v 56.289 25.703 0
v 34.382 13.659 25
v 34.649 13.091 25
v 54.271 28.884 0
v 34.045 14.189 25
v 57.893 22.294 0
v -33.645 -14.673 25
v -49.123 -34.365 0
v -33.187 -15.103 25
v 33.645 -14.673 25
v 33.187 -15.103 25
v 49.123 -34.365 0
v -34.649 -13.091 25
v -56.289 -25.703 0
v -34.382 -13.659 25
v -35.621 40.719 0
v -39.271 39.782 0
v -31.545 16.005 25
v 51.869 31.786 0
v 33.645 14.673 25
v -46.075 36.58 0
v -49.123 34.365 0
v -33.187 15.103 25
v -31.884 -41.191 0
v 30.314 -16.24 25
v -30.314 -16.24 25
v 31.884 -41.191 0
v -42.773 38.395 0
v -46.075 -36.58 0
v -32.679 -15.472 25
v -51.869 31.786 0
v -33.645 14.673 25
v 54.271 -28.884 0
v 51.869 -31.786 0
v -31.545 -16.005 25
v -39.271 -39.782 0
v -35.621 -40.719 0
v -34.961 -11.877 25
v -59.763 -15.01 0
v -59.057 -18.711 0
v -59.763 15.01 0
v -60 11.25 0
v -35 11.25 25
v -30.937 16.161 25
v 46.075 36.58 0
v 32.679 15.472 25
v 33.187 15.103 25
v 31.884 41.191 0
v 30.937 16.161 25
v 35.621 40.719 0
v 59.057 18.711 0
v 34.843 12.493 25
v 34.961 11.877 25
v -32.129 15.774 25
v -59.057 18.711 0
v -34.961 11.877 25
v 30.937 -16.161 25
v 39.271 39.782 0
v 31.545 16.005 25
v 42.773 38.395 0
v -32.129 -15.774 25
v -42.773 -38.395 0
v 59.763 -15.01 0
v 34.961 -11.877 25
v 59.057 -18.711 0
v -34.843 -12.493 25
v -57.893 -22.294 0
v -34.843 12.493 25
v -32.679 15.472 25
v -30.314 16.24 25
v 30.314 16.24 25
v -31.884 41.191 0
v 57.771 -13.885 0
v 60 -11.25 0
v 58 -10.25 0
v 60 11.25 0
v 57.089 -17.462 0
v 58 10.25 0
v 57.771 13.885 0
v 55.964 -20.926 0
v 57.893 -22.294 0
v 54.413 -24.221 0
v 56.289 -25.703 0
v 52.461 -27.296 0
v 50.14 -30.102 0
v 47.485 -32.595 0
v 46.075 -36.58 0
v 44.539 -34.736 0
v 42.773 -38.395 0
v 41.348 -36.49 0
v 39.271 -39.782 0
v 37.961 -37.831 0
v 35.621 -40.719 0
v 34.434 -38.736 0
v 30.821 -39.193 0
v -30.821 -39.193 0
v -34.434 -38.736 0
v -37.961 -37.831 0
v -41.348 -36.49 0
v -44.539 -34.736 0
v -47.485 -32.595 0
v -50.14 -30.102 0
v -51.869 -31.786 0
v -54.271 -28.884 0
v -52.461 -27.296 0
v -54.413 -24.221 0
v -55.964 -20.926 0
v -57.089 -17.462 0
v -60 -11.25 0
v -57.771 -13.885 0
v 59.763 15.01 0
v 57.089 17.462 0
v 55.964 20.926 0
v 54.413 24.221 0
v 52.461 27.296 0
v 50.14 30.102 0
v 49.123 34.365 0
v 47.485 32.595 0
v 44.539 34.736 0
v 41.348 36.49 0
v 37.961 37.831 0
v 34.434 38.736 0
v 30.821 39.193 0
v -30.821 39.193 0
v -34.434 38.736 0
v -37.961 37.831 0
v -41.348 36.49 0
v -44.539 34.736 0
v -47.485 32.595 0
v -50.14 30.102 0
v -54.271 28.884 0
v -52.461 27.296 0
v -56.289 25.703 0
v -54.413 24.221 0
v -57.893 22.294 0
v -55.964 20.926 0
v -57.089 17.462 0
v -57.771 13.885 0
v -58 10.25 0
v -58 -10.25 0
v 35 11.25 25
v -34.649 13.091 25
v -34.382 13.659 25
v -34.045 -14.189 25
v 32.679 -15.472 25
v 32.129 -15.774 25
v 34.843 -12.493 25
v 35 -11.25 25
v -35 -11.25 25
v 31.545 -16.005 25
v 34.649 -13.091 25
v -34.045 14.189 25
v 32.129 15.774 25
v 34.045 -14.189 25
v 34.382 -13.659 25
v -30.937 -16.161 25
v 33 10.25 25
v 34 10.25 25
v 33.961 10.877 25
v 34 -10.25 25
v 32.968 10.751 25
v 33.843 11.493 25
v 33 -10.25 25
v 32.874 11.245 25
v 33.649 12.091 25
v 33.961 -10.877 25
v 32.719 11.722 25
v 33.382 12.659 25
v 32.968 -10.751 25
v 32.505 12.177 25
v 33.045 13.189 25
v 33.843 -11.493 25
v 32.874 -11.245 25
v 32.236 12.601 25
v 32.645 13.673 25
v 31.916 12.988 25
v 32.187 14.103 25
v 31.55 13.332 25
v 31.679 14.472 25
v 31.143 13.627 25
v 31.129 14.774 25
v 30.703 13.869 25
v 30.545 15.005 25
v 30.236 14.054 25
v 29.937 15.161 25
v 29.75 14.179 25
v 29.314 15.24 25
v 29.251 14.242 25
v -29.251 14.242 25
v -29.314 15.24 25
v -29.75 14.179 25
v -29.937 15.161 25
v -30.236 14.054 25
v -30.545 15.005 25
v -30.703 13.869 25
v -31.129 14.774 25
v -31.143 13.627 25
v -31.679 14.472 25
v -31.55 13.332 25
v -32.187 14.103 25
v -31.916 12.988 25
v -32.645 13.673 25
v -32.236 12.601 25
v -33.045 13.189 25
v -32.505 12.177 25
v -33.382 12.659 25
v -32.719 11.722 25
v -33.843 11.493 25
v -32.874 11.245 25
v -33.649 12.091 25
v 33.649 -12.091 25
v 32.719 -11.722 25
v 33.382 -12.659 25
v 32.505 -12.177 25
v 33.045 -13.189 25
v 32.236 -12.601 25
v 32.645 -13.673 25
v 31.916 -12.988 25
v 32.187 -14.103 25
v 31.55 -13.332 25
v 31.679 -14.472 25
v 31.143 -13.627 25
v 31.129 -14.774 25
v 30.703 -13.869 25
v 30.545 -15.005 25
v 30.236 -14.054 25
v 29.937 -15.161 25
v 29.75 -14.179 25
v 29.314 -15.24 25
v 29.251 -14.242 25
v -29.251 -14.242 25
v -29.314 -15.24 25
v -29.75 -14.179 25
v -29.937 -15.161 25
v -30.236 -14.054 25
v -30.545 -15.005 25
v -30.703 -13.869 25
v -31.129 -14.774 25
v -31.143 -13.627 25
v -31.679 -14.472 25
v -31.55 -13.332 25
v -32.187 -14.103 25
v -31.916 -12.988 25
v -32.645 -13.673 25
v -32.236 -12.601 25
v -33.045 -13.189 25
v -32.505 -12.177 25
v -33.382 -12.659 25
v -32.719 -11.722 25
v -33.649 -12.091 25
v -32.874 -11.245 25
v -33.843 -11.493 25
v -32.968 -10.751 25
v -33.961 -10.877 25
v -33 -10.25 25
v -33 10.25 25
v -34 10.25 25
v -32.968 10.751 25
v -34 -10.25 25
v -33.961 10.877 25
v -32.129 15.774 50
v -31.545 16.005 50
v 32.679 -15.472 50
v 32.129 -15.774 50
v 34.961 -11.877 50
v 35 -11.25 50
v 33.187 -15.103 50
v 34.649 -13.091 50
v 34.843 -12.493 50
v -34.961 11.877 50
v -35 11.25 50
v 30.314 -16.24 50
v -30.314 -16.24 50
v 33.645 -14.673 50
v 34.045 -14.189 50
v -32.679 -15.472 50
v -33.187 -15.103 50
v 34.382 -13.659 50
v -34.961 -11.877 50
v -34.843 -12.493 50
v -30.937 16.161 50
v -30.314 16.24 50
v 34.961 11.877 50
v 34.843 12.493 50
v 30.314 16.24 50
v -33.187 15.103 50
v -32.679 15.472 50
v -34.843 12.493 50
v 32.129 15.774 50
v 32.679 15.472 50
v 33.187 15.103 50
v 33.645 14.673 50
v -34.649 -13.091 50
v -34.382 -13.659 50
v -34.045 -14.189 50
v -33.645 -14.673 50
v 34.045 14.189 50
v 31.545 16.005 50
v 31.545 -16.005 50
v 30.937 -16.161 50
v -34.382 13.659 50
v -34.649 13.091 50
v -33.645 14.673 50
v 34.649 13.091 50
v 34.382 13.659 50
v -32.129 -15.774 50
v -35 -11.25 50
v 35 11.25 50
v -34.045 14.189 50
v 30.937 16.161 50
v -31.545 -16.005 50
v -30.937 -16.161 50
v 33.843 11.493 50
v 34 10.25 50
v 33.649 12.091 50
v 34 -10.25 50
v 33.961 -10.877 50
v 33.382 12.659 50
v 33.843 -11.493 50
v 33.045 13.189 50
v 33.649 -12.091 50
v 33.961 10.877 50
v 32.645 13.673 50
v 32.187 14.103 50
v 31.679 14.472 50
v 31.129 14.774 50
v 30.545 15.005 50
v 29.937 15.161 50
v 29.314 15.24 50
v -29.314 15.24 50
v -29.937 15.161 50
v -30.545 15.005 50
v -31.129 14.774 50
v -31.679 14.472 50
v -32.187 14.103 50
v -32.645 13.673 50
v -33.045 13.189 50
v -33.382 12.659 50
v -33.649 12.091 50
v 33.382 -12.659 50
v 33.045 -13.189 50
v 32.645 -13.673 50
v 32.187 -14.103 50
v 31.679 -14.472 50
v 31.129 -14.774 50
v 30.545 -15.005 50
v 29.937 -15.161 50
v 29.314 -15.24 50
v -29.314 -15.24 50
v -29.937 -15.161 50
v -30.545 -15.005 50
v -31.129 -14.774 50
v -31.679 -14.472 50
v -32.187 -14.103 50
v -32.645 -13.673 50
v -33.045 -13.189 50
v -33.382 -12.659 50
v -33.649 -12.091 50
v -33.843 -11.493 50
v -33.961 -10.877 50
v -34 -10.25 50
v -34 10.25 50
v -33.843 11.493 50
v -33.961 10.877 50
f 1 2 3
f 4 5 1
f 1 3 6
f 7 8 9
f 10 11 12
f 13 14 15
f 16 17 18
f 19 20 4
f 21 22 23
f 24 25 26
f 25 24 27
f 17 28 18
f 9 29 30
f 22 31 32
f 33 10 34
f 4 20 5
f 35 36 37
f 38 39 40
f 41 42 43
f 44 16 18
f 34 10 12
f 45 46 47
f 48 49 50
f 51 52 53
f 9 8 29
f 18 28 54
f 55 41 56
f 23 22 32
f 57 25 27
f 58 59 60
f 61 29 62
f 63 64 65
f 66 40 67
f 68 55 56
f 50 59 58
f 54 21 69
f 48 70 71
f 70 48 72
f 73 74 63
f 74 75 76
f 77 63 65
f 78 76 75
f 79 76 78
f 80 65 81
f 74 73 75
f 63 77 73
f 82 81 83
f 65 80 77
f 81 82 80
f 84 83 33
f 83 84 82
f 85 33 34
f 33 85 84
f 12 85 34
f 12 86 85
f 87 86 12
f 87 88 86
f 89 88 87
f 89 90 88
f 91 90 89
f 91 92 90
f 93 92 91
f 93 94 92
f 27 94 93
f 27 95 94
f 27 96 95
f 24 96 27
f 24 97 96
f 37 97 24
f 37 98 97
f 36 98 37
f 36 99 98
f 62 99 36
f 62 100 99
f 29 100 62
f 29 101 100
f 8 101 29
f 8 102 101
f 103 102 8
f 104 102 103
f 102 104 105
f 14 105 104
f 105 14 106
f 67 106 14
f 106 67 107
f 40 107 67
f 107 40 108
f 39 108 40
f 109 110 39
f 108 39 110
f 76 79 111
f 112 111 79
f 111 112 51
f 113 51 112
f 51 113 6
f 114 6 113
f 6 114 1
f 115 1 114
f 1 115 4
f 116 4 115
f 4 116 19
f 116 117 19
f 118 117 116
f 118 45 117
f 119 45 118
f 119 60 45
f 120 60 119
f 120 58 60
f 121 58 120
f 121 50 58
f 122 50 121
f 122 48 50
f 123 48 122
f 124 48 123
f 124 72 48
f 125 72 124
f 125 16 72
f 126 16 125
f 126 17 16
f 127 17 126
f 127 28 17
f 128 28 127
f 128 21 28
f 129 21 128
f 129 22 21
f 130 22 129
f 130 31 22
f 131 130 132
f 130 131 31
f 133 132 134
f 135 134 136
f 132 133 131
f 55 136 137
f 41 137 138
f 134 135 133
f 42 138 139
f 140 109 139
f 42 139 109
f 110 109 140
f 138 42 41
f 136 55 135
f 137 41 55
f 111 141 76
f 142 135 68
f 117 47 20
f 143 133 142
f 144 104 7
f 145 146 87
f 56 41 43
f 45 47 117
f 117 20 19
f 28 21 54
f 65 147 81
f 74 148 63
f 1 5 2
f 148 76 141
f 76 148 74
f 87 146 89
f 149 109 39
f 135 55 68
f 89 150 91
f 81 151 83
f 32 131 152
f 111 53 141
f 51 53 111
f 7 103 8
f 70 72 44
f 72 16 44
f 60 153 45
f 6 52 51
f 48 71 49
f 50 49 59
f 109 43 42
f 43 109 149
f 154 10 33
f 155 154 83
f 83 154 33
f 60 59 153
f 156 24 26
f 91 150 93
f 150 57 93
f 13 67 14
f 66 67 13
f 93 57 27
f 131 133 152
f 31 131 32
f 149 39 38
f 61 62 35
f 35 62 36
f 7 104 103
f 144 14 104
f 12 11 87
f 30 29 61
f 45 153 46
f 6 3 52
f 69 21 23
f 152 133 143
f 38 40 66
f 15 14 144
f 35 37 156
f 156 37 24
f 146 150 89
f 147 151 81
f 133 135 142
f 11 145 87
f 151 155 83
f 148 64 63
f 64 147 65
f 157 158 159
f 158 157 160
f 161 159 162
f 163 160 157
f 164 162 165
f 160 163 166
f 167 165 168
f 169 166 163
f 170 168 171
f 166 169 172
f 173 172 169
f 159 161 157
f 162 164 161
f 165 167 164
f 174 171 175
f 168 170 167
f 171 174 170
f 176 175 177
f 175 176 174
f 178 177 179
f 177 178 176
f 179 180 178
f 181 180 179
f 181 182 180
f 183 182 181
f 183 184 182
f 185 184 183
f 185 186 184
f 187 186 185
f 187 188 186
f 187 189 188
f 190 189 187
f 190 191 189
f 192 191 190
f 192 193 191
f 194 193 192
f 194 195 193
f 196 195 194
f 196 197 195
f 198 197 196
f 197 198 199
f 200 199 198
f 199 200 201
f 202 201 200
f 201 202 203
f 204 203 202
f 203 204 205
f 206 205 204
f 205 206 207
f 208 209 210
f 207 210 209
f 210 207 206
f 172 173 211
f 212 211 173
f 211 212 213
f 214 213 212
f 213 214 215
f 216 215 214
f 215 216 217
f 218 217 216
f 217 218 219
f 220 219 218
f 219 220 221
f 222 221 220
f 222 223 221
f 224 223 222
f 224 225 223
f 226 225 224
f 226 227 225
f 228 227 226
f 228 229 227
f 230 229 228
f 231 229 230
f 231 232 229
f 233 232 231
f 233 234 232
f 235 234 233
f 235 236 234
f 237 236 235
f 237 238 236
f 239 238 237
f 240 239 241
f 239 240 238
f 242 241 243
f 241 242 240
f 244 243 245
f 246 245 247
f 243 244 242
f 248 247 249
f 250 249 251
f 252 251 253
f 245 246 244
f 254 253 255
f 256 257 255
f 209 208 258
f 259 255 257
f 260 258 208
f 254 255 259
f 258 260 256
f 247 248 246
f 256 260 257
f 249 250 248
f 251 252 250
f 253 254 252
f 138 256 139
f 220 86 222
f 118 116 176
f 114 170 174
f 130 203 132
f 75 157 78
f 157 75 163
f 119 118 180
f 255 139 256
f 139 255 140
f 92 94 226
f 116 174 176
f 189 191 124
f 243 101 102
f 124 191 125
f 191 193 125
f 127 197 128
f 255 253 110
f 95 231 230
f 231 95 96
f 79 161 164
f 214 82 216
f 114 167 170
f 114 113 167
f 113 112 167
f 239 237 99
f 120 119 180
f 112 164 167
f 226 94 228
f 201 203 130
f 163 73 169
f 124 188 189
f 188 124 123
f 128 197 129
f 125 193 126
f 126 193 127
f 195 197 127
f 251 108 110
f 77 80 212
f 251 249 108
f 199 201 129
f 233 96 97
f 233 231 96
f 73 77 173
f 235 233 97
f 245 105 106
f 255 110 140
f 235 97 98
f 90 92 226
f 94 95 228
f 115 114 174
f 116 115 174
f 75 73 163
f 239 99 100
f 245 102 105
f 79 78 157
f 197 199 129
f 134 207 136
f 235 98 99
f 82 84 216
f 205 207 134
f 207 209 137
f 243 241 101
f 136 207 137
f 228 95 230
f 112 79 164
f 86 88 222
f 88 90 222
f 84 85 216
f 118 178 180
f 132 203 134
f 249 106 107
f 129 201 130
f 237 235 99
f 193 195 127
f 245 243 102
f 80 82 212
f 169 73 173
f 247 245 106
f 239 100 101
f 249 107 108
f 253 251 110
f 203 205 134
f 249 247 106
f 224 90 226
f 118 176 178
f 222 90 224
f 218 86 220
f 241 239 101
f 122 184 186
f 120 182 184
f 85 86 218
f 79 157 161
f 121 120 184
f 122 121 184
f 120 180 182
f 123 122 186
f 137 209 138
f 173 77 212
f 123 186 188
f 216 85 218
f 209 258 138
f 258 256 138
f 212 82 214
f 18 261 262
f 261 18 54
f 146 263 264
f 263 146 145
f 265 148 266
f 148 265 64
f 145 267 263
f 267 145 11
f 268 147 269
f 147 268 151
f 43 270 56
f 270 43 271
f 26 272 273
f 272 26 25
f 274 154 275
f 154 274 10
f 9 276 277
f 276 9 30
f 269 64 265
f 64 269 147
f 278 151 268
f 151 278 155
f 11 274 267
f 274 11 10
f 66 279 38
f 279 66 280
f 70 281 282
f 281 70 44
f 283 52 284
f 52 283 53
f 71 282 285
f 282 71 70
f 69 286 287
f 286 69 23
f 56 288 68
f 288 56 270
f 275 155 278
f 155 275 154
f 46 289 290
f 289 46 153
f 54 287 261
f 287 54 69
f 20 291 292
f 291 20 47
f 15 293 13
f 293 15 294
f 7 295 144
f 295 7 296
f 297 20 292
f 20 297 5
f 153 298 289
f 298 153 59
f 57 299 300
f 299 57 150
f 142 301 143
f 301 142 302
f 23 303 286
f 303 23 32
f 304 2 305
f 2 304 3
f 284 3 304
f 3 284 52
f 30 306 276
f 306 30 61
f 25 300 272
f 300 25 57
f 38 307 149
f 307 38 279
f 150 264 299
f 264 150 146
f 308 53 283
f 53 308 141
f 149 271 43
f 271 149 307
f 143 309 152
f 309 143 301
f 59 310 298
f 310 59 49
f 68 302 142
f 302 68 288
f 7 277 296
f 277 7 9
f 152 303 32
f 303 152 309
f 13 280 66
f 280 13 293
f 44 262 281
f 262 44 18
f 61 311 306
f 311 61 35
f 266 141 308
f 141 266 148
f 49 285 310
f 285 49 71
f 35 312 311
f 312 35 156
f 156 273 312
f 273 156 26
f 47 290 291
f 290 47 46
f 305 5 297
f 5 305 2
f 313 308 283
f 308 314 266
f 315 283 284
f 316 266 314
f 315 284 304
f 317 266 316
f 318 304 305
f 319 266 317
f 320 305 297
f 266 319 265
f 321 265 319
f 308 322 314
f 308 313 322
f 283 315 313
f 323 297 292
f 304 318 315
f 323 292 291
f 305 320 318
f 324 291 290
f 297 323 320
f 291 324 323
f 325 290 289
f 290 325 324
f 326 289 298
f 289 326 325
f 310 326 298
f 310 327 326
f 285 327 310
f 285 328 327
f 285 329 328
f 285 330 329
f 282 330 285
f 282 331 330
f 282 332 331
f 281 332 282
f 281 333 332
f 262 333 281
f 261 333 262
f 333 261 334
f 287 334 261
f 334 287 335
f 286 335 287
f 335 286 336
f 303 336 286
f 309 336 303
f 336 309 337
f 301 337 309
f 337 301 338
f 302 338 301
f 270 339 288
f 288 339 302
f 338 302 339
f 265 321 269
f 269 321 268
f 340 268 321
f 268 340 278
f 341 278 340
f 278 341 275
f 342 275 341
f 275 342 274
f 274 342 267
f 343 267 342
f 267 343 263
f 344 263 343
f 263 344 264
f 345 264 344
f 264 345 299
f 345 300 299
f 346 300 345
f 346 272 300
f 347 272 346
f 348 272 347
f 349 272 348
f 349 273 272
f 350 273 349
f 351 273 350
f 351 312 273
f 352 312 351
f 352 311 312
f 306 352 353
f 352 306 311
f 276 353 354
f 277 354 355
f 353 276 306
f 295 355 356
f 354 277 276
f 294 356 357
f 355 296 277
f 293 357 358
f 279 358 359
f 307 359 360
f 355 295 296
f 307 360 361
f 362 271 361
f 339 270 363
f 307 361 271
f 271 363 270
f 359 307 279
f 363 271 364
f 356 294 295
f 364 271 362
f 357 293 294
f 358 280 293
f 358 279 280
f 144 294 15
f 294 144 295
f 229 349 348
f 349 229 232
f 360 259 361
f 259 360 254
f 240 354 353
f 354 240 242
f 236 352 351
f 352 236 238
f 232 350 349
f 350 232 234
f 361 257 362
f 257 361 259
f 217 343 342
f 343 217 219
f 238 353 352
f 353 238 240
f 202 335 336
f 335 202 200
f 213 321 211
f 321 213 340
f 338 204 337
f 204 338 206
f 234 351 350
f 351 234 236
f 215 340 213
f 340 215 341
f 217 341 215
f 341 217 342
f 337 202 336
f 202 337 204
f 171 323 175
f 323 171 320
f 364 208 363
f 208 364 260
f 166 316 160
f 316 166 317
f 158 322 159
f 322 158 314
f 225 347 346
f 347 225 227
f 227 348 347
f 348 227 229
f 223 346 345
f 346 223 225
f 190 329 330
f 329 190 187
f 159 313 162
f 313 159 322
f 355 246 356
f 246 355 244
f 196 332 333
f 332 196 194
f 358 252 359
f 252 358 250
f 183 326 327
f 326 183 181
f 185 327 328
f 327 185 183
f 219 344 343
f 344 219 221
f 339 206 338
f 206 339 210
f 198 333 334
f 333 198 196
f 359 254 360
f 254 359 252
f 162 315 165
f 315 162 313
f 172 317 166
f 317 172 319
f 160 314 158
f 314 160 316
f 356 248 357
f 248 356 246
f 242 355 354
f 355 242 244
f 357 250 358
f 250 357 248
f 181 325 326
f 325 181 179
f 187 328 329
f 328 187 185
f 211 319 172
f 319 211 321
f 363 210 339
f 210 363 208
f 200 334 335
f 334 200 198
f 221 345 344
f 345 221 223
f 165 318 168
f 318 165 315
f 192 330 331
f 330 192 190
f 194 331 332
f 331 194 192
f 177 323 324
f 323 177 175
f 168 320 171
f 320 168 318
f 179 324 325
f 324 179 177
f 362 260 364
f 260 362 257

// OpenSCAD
$fn = 50;


difference() {
	union() {
		translate(v = [0, 0, 0]) {
			rotate(a = [0, 0, 0]) {
				difference() {
					union() {
						hull() {
							translate(v = [-30.0000000000, 11.2500000000, 0]) {
								cylinder(h = 25, r = 5, r1 = 30.0000000000, r2 = 5);
							}
							translate(v = [30.0000000000, 11.2500000000, 0]) {
								cylinder(h = 25, r = 5, r1 = 30.0000000000, r2 = 5);
							}
							translate(v = [-30.0000000000, -11.2500000000, 0]) {
								cylinder(h = 25, r = 5, r1 = 30.0000000000, r2 = 5);
							}
							translate(v = [30.0000000000, -11.2500000000, 0]) {
								cylinder(h = 25, r = 5, r1 = 30.0000000000, r2 = 5);
							}
						}
					}
					union() {
						hull() {
							translate(v = [-29.0000000000, 10.2500000000, 0]) {
								cylinder(h = 25, r = 5, r1 = 29.0000000000, r2 = 4);
							}
							translate(v = [29.0000000000, 10.2500000000, 0]) {
								cylinder(h = 25, r = 5, r1 = 29.0000000000, r2 = 4);
							}
							translate(v = [-29.0000000000, -10.2500000000, 0]) {
								cylinder(h = 25, r = 5, r1 = 29.0000000000, r2 = 4);
							}
							translate(v = [29.0000000000, -10.2500000000, 0]) {
								cylinder(h = 25, r = 5, r1 = 29.0000000000, r2 = 4);
							}
						}
					}
				}
			}
		}
		translate(v = [0, 0, 25]) {
			rotate(a = [0, 0, 0]) {
				difference() {
					union() {
						hull() {
							translate(v = [-30.0000000000, 11.2500000000, 0]) {
								cylinder(h = 25, r = 5);
							}
							translate(v = [30.0000000000, 11.2500000000, 0]) {
								cylinder(h = 25, r = 5);
							}
							translate(v = [-30.0000000000, -11.2500000000, 0]) {
								cylinder(h = 25, r = 5);
							}
							translate(v = [30.0000000000, -11.2500000000, 0]) {
								cylinder(h = 25, r = 5);
							}
						}
					}
					union() {
						hull() {
							translate(v = [-29.0000000000, 10.2500000000, 0]) {
								cylinder(h = 25, r = 5);
							}
							translate(v = [29.0000000000, 10.2500000000, 0]) {
								cylinder(h = 25, r = 5);
							}
							translate(v = [-29.0000000000, -10.2500000000, 0]) {
								cylinder(h = 25, r = 5);
							}
							translate(v = [29.0000000000, -10.2500000000, 0]) {
								cylinder(h = 25, r = 5);
							}
						}
					}
				}
			}
		}
	}
	union();
}
